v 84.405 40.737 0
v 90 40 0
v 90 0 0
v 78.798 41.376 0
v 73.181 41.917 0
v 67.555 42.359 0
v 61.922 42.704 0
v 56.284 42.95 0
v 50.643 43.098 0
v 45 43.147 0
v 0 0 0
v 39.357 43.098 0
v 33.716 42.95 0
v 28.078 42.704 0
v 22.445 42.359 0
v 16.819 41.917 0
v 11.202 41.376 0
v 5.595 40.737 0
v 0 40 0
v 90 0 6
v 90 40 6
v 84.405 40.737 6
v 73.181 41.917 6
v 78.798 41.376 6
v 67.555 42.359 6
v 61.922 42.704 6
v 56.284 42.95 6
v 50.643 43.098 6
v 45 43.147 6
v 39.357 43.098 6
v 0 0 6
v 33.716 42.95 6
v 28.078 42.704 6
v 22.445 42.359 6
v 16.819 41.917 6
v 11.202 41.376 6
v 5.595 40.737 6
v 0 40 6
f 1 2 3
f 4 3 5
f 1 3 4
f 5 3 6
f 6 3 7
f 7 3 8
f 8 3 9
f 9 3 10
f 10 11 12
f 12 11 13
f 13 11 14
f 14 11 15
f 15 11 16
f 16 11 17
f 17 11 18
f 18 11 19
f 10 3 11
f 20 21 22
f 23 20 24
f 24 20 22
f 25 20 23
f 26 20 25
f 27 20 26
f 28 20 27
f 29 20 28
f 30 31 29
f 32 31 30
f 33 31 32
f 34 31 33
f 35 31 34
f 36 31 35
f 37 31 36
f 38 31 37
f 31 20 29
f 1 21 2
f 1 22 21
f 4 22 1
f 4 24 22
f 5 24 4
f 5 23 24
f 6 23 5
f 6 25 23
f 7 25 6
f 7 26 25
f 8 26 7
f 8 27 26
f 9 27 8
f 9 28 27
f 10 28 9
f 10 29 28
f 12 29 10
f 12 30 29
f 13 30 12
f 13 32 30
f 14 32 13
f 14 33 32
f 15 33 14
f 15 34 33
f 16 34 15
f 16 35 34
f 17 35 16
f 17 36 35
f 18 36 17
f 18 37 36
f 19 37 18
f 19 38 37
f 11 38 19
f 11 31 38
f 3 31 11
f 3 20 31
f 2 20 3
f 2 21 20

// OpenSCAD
$fn = 32;

// ----------------------------------------------------------------------
// Arc profile plate: crown, 19 points
// ----------------------------------------------------------------------

// --- parameters (mm) ---
bar_l = 90;               // bar length, X
bar_w = 40;               // bar height at the ends, Y
arc_r = 323.34;           // radius of the crown arc
arc_angle = 16;           // crown arc angle, degrees
crown_rise = 3.15;        // rise of the crown over the ends
arc_step = 1;             // sampling step of the crown arc, degrees
plate_t = 6;              // plate thickness, Z
fit_tol = 0.02;           // declared fit tolerance (prompt contract)
free_tol = 0.2;           // declared free tolerance (prompt contract)

bbox_y = bar_w + crown_rise;  // full height with the crown

profile = [[90, 40], [84.405, 40.737], [78.798, 41.376], [73.181, 41.917], [67.555, 42.359], [61.922, 42.704], [56.284, 42.95], [50.643, 43.098], [45, 43.147], [39.357, 43.098], [33.716, 42.95], [28.078, 42.704], [22.445, 42.359], [16.819, 41.917], [11.202, 41.376], [5.595, 40.737], [0, 40], [0, 0], [90, 0]];  // primary outline, 19 points, counter clockwise

// --- the one profile operation ---
linear_extrude(height = plate_t) polygon(points = profile);
